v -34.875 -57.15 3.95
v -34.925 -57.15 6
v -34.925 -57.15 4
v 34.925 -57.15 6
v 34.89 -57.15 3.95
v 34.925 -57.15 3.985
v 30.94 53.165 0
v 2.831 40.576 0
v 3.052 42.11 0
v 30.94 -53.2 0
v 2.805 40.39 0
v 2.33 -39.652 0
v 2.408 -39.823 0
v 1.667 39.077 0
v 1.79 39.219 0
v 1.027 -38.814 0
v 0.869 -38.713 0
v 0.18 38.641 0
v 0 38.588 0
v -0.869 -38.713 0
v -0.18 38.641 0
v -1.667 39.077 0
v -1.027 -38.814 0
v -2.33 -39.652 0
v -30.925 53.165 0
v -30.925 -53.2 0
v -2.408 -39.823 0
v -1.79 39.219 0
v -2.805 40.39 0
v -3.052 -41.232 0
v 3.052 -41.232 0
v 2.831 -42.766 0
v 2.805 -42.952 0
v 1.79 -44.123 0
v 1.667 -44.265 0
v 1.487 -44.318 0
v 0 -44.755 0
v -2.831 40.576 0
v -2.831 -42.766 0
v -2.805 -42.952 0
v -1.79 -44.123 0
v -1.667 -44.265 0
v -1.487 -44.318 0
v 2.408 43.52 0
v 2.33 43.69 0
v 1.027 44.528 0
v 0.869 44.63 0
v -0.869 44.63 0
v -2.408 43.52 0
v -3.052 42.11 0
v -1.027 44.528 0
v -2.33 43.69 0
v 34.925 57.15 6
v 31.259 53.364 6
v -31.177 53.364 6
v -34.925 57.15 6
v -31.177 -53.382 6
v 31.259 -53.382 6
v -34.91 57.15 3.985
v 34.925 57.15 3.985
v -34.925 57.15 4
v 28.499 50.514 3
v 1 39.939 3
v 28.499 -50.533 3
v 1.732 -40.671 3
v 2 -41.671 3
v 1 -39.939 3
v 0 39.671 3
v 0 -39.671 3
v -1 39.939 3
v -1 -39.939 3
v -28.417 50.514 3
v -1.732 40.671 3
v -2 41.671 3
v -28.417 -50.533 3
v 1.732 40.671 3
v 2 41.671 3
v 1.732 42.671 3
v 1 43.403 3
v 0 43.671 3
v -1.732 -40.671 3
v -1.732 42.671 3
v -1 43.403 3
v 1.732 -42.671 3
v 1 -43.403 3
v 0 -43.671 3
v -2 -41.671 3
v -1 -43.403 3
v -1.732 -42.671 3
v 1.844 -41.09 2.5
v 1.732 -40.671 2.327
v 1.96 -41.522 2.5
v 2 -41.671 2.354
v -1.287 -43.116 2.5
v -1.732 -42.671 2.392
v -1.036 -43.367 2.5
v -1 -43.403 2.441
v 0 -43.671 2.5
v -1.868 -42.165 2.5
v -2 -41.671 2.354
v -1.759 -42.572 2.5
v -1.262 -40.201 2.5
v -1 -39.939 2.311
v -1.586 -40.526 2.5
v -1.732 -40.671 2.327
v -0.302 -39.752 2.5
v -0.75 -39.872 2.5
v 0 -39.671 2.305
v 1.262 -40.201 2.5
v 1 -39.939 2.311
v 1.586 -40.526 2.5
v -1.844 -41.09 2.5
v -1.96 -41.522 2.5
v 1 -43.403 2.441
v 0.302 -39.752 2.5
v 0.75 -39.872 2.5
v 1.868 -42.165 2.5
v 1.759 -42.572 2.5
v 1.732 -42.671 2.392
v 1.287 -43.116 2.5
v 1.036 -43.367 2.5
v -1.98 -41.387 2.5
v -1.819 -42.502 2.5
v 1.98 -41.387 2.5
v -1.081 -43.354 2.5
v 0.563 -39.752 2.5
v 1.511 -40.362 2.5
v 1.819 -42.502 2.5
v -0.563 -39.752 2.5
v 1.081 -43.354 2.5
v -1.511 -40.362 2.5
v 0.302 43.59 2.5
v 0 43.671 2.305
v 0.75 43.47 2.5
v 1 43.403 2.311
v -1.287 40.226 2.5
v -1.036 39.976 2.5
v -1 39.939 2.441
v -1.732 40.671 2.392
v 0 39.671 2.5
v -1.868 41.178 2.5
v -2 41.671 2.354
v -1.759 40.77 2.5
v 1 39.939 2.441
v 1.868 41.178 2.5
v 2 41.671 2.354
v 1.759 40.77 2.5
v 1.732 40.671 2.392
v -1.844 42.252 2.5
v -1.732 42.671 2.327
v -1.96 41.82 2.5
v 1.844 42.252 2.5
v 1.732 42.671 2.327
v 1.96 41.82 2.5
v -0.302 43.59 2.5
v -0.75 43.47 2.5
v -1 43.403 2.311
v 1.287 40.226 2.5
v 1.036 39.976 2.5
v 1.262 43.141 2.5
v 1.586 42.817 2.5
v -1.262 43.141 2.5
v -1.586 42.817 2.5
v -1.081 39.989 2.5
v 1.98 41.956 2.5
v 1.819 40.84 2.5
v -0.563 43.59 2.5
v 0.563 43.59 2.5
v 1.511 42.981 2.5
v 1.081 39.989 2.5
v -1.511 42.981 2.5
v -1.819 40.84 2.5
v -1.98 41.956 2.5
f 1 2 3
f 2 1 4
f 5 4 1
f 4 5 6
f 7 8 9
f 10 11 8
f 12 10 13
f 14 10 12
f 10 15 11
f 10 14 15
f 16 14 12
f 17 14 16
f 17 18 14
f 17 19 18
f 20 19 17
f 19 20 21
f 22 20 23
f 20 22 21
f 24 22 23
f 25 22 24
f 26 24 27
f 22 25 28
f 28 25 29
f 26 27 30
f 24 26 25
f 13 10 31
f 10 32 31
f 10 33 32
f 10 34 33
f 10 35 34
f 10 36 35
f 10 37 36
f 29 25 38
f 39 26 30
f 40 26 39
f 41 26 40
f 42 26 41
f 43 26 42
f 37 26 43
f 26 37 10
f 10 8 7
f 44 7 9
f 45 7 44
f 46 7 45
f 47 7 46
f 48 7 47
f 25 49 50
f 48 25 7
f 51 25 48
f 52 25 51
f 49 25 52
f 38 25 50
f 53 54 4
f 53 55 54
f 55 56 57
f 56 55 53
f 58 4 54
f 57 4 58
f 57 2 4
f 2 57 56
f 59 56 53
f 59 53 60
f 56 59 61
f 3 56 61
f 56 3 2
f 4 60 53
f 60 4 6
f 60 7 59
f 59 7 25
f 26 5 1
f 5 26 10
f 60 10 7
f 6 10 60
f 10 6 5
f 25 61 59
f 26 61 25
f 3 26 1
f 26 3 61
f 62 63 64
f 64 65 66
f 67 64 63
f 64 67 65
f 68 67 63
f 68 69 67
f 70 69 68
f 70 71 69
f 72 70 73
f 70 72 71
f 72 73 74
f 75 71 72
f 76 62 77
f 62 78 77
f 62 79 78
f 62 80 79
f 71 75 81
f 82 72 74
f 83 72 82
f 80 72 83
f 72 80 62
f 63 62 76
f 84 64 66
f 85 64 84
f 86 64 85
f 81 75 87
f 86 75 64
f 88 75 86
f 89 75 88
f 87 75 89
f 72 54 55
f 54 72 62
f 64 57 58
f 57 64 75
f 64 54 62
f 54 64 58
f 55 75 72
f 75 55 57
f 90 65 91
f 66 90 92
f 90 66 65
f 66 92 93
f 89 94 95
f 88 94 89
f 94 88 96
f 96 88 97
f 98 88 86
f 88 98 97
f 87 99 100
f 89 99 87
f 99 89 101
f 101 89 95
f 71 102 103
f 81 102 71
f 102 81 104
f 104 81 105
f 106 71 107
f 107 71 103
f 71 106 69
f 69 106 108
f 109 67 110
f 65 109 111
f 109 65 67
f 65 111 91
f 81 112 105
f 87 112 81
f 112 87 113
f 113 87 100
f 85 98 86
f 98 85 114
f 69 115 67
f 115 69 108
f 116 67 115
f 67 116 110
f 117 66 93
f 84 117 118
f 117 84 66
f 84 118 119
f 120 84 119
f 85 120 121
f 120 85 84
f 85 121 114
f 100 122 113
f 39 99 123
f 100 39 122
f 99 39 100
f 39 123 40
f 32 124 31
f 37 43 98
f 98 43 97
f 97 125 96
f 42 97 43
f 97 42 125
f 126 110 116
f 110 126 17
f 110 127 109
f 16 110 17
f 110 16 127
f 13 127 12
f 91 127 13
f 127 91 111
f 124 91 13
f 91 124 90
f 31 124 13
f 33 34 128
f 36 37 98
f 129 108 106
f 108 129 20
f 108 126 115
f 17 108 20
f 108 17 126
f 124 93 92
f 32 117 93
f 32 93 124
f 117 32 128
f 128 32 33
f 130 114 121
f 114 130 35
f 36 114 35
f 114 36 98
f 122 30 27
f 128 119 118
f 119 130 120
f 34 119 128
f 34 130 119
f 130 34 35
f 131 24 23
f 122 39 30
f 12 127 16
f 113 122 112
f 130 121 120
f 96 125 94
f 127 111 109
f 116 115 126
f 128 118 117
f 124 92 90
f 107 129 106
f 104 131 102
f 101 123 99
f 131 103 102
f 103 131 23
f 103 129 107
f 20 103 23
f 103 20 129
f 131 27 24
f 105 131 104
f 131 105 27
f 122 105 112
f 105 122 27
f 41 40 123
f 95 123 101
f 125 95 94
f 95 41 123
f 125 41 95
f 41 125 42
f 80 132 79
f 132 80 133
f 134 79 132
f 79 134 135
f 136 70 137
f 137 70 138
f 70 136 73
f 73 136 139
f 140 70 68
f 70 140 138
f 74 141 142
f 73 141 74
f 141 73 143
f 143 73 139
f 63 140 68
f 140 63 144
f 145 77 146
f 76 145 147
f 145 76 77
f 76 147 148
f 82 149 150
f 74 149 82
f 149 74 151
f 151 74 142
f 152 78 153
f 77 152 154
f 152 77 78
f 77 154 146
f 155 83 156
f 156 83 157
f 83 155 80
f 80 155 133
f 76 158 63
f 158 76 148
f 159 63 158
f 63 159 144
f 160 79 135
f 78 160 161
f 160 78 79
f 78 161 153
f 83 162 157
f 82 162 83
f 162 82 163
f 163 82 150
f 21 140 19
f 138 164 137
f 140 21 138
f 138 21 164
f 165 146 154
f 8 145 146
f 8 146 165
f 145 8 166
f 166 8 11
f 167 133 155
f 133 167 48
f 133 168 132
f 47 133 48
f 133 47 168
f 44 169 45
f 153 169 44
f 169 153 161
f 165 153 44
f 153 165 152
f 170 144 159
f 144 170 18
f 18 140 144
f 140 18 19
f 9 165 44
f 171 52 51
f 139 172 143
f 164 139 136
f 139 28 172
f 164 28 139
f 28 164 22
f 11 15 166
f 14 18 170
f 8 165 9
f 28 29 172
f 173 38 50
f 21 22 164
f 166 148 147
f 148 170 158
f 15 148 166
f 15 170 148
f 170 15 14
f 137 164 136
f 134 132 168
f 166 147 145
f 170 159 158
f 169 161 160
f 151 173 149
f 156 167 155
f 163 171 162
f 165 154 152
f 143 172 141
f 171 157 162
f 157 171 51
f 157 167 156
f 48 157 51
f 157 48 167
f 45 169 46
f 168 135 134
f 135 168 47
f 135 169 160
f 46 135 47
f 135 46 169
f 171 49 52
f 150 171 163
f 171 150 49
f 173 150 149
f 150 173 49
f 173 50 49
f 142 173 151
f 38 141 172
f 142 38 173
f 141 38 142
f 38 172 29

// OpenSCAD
// [FL_INDEX: keywords="openscad, 3d_parametric, WALLY_-_Wall_Plate_Customizer, csg_solid" | COT="Parametric OpenSCAD design from 3DCodeverse"]
// Title: WALLY - Wall Plate Customizer

// WALLY - Wall Plate Customizer v1.3
// by TheNewHobbyist 2013 (http://thenewhobbyist.com)
// http://www.thingiverse.com/thing:47956
//
// Most of the connectors used with this thing are panel mount connectors from
// www.DataPro.net I can't vouch for their quality but they did have easy to
// find dimensions for their products so I used them.
//
// This could be tightened up considerably but I thought I'd get it out there for people
// to experiment with before I lose my mind staring at it too long. Also this is my
// first OpenSCAD model so cut me some slack ;)
//
//   Notes:
//
// * The plug types "Duplex Outlet", "Long_Toggle Switch", "Toggle Switch", and "Rocker"
//   will all use the entire plate when selected in top or bottom configuration. The
//   other selection (if not "none" will be selected.
//
// * "None" and "Blank should not be considered equal. if "None" is selected for one of
//   the two holes on a plate the other selection will be centered on that plate. If
//   "Blank" is selected that plug location will remain blank but the other selection
//   will NOT move into a centered position.
//
//	Change Log:
//
//	v1.1
//	UPDATED: Screw hole locations for designer and toggle plate types.
//	UPDATED: Hole size for designer plate type.
//	UPDATED: Outlet hole spacing
//
//	v1.2
//	ADDED: Long Toggle Switch for laird
//
//	v1.3
//	ADDED: 3 new sizes for plate export: Standard, Junior-Jumbo, and Jumbo.
//

  //////////////////////////
 // Customizer Settings: //
//////////////////////////

//How big are we talkin' here?
plate_width = 1; //	[1:5]

// Bigger hole in your wall? Try this
plate_size = 0; // [0:Standard, 1:Junior-Jumbo, 2:Jumbo]

//Pick a plug or full plate type
1st_plate = "none";  //	["none":None, "blank":Blank Port, "toggle":Full Plate - Toggle Switch, "long_toggle":Full Plate - Long Toggle Switch, "outlet":Full Plate - Duplex Outlet, "rocker":Full Plate - Rocker/Designer Plate, "keystone1":Keystone Jack, "vga":VGA Port, "hdmi":HDMI Port, "dvi":DVI-I Port, "displayport":Displayport, "cat5e":Cat5e/Cat6 Port, "usb-a":USB-A Port, "usb-b":USB-B Port, "firewire":Firewire IEEE 1394 Port, "db09":DB-09 Port, "ps2":PS2 Port, "f-type": F-Type/Coaxial Port,"svideo":S-Video Port, "stereo":Stereo Headphone Jack]
//Pick a bottom plug type or leave as none
1st_plate_bottom_hole = "none";  //	["none":None, "blank":Blank Port, "keystone1":Keystone Jack, "vga":VGA Port, "hdmi":HDMI Port, "dvi":DVI-I Port, "displayport":Displayport, "cat5e":Cat5e/Cat6 Port, "usb-a":USB-A Port, "usb-b":USB-B Port, "firewire":Firewire IEEE 1394 Port, "db09":DB-09 Port, "ps2":PS2 Port, "f-type": F-Type/Coaxial Port,"svideo":S-Video Port, "stereo":Stereo Headphone Jack]
//Pick a plug or full plate type
2nd_plate = "none";  //	["none":None, "blank":Blank Port, "toggle":Full Plate - Toggle Switch, "long_toggle":Full Plate - Long Toggle Switch, "outlet":Full Plate - Duplex Outlet, "rocker":Full Plate - Rocker/Designer Plate, "keystone1":Keystone Jack, "vga":VGA Port, "hdmi":HDMI Port, "dvi":DVI-I Port, "displayport":Displayport, "cat5e":Cat5e/Cat6 Port, "usb-a":USB-A Port, "usb-b":USB-B Port, "firewire":Firewire IEEE 1394 Port, "db09":DB-09 Port, "ps2":PS2 Port, "f-type": F-Type/Coaxial Port,"svideo":S-Video Port, "stereo":Stereo Headphone Jack]
//Pick a bottom plug type or leave as none
2nd_plate_bottom_hole = "none";  //	["none":None, "blank":Blank Port, "keystone1":Keystone Jack, "vga":VGA Port, "hdmi":HDMI Port, "dvi":DVI-I Port, "displayport":Displayport, "cat5e":Cat5e/Cat6 Port, "usb-a":USB-A Port, "usb-b":USB-B Port, "firewire":Firewire IEEE 1394 Port, "db09":DB-09 Port, "ps2":PS2 Port, "f-type": F-Type/Coaxial Port,"svideo":S-Video Port, "stereo":Stereo Headphone Jack]
//Pick a plug or full plate type
3rd_plate = "none";  //	["none":None, "blank":Blank Port, "toggle":Full Plate - Toggle Switch, "long_toggle":Full Plate - Long Toggle Switch, "outlet":Full Plate - Duplex Outlet, "rocker":Full Plate - Rocker/Designer Plate, "keystone1":Keystone Jack, "vga":VGA Port, "hdmi":HDMI Port, "dvi":DVI-I Port, "displayport":Displayport, "cat5e":Cat5e/Cat6 Port, "usb-a":USB-A Port, "usb-b":USB-B Port, "firewire":Firewire IEEE 1394 Port, "db09":DB-09 Port, "ps2":PS2 Port, "f-type": F-Type/Coaxial Port,"svideo":S-Video Port, "stereo":Stereo Headphone Jack]
//Pick a bottom plug type or leave as none
3rd_plate_bottom_hole = "none";  //	["none":None, "blank":Blank Port, "keystone1":Keystone Jack, "vga":VGA Port, "hdmi":HDMI Port, "dvi":DVI-I Port, "displayport":Displayport, "cat5e":Cat5e/Cat6 Port, "usb-a":USB-A Port, "usb-b":USB-B Port, "firewire":Firewire IEEE 1394 Port, "db09":DB-09 Port, "ps2":PS2 Port, "f-type": F-Type/Coaxial Port,"svideo":S-Video Port, "stereo":Stereo Headphone Jack]
//Pick a plug or full plate type
4th_plate = "none";  //["none":None, "blank":Blank Port, "toggle":Full Plate - Toggle Switch, "long_toggle":Full Plate - Long Toggle Switch, "outlet":Full Plate - Duplex Outlet, "rocker":Full Plate - Rocker/Designer Plate, "keystone1":Keystone Jack, "vga":VGA Port, "hdmi":HDMI Port, "dvi":DVI-I Port, "displayport":Displayport, "cat5e":Cat5e/Cat6 Port, "usb-a":USB-A Port, "usb-b":USB-B Port, "firewire":Firewire IEEE 1394 Port, "db09":DB-09 Port, "ps2":PS2 Port, "f-type": F-Type/Coaxial Port,"svideo":S-Video Port, "stereo":Stereo Headphone Jack]
//Pick a bottom plug type or leave as none
4th_plate_bottom_hole = "none";  //	["none":None, "blank":Blank Port, "keystone1":Keystone Jack, "vga":VGA Port, "hdmi":HDMI Port, "dvi":DVI-I Port, "displayport":Displayport, "cat5e":Cat5e/Cat6 Port, "usb-a":USB-A Port, "usb-b":USB-B Port, "firewire":Firewire IEEE 1394 Port, "db09":DB-09 Port, "ps2":PS2 Port, "f-type": F-Type/Coaxial Port,"svideo":S-Video Port, "stereo":Stereo Headphone Jack]
//Pick a plug or full plate type
5th_plate = "none";  //["none":None, "blank":Blank Port, "toggle":Full Plate - Toggle Switch, "long_toggle":Full Plate - Long Toggle Switch, "outlet":Full Plate - Duplex Outlet, "rocker":Full Plate - Rocker/Designer Plate, "keystone1":Keystone Jack, "vga":VGA Port, "hdmi":HDMI Port, "dvi":DVI-I Port, "displayport":Displayport, "cat5e":Cat5e/Cat6 Port, "usb-a":USB-A Port, "usb-b":USB-B Port, "firewire":Firewire IEEE 1394 Port, "db09":DB-09 Port, "ps2":PS2 Port, "f-type": F-Type/Coaxial Port,"svideo":S-Video Port, "stereo":Stereo Headphone Jack]
//Pick a bottom plug type or leave as none
5th_plate_bottom_hole = "none";  //	["none":None, "blank":Blank Port, "keystone1":Keystone Jack, "vga":VGA Port, "hdmi":HDMI Port, "dvi":DVI-I Port, "displayport":Displayport, "cat5e":Cat5e/Cat6 Port, "usb-a":USB-A Port, "usb-b":USB-B Port, "firewire":Firewire IEEE 1394 Port, "db09":DB-09 Port, "ps2":PS2 Port, "f-type": F-Type/Coaxial Port,"svideo":S-Video Port, "stereo":Stereo Headphone Jack]

  //////////////////////
 // Static Settings: //
//////////////////////

module GoAwayCustomizer() {
// This module is here to stop Customizer from picking up the variables below
}

l_offset = [34.925,39.6875,44.45];
r_offset = [34.925,39.6875,44.45];
spacer = [0,0,46.0375,92.075,138.1125,184.15];
solid_plate_width = l_offset[plate_size] + spacer[plate_width] + r_offset[plate_size];

height_sizes = [114.3,123.825,133.35];

height = 114.3; //plate height (static)
gang_width=[0,69.86,115.824,161.925,206.375,254]; // Plate widths (standard)

edgewidth = solid_plate_width + 10; // Bevel setting for top and bottom
rightbevel = solid_plate_width - 4; // Bevel for right side (scales)

left_offset = 34.925; // Offset first hole position
switch_offset = 46.0375; // Offset all additional holes
thinner_offset=[0,0.92,0.95,0.96,0.97,0.973]; // Manual fix for right side wackiness

positions=[height_sizes[plate_size]/2,height_sizes[plate_size]/2 - 14.25,height_sizes[plate_size]/2 + 14.25];

// preview[view:north, tilt:bottom]

  ///////////////////
 // Hole Control: //
///////////////////

module plate1(){
	if (1st_plate == "toggle" || 1st_plate_bottom_hole == "toggle"){
		translate([0,l_offset[plate_size],0]) toggle_screws();
		translate([0,l_offset[plate_size],0]) hole("toggle");
		}
	else if (1st_plate == "long_toggle" || 1st_plate_bottom_hole == "long_toggle"){
		translate([0,l_offset[plate_size],0]) toggle_screws();
		translate([0,l_offset[plate_size],0]) hole("long_toggle");
		}
	else if (1st_plate == "rocker" || 1st_plate_bottom_hole == "rocker"){
		translate([0,l_offset[plate_size],0]) rocker_screws();
		translate([0,l_offset[plate_size],0]) hole("rocker");
		}
	else if (1st_plate == "outlet" || 1st_plate_bottom_hole == "outlet") {
	translate([0,l_offset[plate_size],0]) hole("outlet");
	}
	else if (1st_plate_bottom_hole == "none") {
		translate([0,l_offset[plate_size],0]) box_screws();
		translate([positions[0],l_offset[plate_size],0]) hole(1st_plate);
			}
	else if (1st_plate == "none") {
		translate([0,l_offset[plate_size],0]) box_screws();
		translate([positions[0],l_offset[plate_size],0]) hole(1st_plate_bottom_hole);
			}
	else {
	translate([0,l_offset[plate_size],0]) box_screws();
	translate([positions[1],l_offset[plate_size],0]) hole(1st_plate);
	translate([positions[2],l_offset[plate_size],0]) hole(1st_plate_bottom_hole);
	}
}

module plate2(){
	if (2nd_plate == "toggle" || 2nd_plate_bottom_hole == "toggle"){
		translate([0,l_offset[plate_size] + switch_offset,0]) toggle_screws();
		translate([0,l_offset[plate_size] + switch_offset,0]) hole("toggle");
		}
	else if (2nd_plate == "long_toggle" || 2nd_plate_bottom_hole == "long_toggle"){
		translate([0,l_offset[plate_size] + switch_offset,0]) toggle_screws();
		translate([0,l_offset[plate_size] + switch_offset,0]) hole("long_toggle");
		}
	else if (2nd_plate == "rocker" || 2nd_plate_bottom_hole == "rocker"){
		translate([0,l_offset[plate_size] + switch_offset,0]) rocker_screws();
		translate([0,l_offset[plate_size] + switch_offset,0]) hole("rocker");
		}
	else if (2nd_plate == "outlet" || 2nd_plate_bottom_hole == "outlet") {
	translate([0,l_offset[plate_size] + switch_offset,0]) hole("outlet");
	}
	else if (2nd_plate_bottom_hole == "none") {
		translate([0,l_offset[plate_size] + switch_offset,0]) box_screws();
		translate([positions[0],l_offset[plate_size] + switch_offset,0]) hole(2nd_plate);
			}
	else if (2nd_plate == "none") {
		translate([0,l_offset[plate_size] + switch_offset,0]) box_screws();
		translate([positions[0],l_offset[plate_size] + switch_offset,0]) hole(2nd_plate_bottom_hole);
			}
	else {
	translate([0,l_offset[plate_size] + switch_offset,0]) box_screws();
	translate([positions[1],l_offset[plate_size] + switch_offset,0]) hole(2nd_plate);
	translate([positions[2],l_offset[plate_size] + switch_offset,0]) hole(2nd_plate_bottom_hole);
	}
}

module plate3(){
	if (3rd_plate == "toggle" || 3rd_plate_bottom_hole == "toggle"){
		translate([0,l_offset[plate_size] + switch_offset * 2,0]) toggle_screws();
		translate([0,l_offset[plate_size] + switch_offset * 2,0]) hole("toggle");
		}
	else if (3rd_plate == "long_toggle" || 3rd_plate_bottom_hole == "long_toggle"){
		translate([0,l_offset[plate_size] + switch_offset * 2,0]) toggle_screws();
		translate([0,l_offset[plate_size] + switch_offset * 2,0]) hole("long_toggle");
		}
	else if (3rd_plate == "rocker" || 3rd_plate_bottom_hole == "rocker"){
		translate([0,l_offset[plate_size] + switch_offset * 2,0]) rocker_screws();
		translate([0,l_offset[plate_size] + switch_offset * 2,0]) hole("rocker");
		}
	else if (3rd_plate == "outlet" || 3rd_plate_bottom_hole == "outlet") {
	translate([0,l_offset[plate_size] + switch_offset * 2,0]) hole("outlet");
	}
	else if (3rd_plate_bottom_hole == "none") {
		translate([0,l_offset[plate_size] + switch_offset * 2,0]) box_screws();
		translate([positions[0],l_offset[plate_size] + switch_offset * 2,0]) hole(3rd_plate);
			}
	else if (3rd_plate == "none") {
		translate([0,l_offset[plate_size] + switch_offset * 2,0]) box_screws();
		translate([positions[0],l_offset[plate_size] + switch_offset * 2,0]) hole(3rd_plate_bottom_hole);
			}
	else {
	translate([0,l_offset[plate_size] + switch_offset * 2,0]) box_screws();
	translate([positions[1],l_offset[plate_size] + switch_offset * 2,0]) hole(3rd_plate);
	translate([positions[2],l_offset[plate_size] + switch_offset * 2,0]) hole(3rd_plate_bottom_hole);
	}
}

module plate4(){
	if (4th_plate == "toggle" || 4th_plate_bottom_hole == "toggle"){
		translate([0,l_offset[plate_size] + switch_offset * 3,0]) toggle_screws();
		translate([0,l_offset[plate_size] + switch_offset * 3,0]) hole("toggle");
		}
	else if (4th_plate == "long_toggle" || 4th_plate_bottom_hole == "long_toggle"){
		translate([0,l_offset[plate_size] + switch_offset * 3,0]) toggle_screws();
		translate([0,l_offset[plate_size] + switch_offset * 3,0]) hole("long_toggle");
		}
	else if (4th_plate == "rocker" || 4th_plate_bottom_hole == "rocker"){
		translate([0,l_offset[plate_size] + switch_offset * 3,0]) rocker_screws();
		translate([0,l_offset[plate_size] + switch_offset * 3,0]) hole("rocker");
		}
	else if (4th_plate == "outlet" || 4th_plate_bottom_hole == "outlet") {
	translate([0,l_offset[plate_size] + switch_offset * 3,0]) hole("outlet");
	}
	else if (4th_plate_bottom_hole == "none") {
		translate([0,l_offset[plate_size] + switch_offset * 3,0]) box_screws();
		translate([positions[0],l_offset[plate_size] + switch_offset * 3,0]) hole(4th_plate);
			}
	else if (4th_plate == "none") {
		translate([0,l_offset[plate_size] + switch_offset * 3,0]) box_screws();
		translate([positions[0],l_offset[plate_size] + switch_offset * 3,0]) hole(4th_plate_bottom_hole);
			}
	else {
	translate([0,l_offset[plate_size] + switch_offset * 3,0]) box_screws();
	translate([positions[1],l_offset[plate_size] + switch_offset * 3,0]) hole(4th_plate);
	translate([positions[2],l_offset[plate_size] + switch_offset * 3,0]) hole(4th_plate_bottom_hole);
	}
}

module plate5(){
	if (5th_plate == "toggle" || 5th_plate_bottom_hole == "toggle"){
		translate([0,l_offset[plate_size] + switch_offset * 4,0]) toggle_screws();
		translate([0,l_offset[plate_size] + switch_offset * 4,0]) hole("toggle");
		}
	else if (5th_plate == "long_toggle" || 5th_plate_bottom_hole == "long_toggle"){
		translate([0,l_offset[plate_size] + switch_offset * 4,0]) toggle_screws();
		translate([0,l_offset[plate_size] + switch_offset * 4,0]) hole("long_toggle");
		}
	else if (5th_plate == "rocker" || 5th_plate_bottom_hole == "rocker"){
		translate([0,l_offset[plate_size] + switch_offset * 4,0]) rocker_screws();
		translate([0,l_offset[plate_size] + switch_offset * 4,0]) hole("rocker");
		}
	else if (5th_plate == "outlet" || 5th_plate_bottom_hole == "outlet") {
	translate([0,l_offset[plate_size] + switch_offset * 4,0]) hole("outlet");
	}
	else if (5th_plate_bottom_hole == "none") {
		translate([0,l_offset[plate_size] + switch_offset * 4,0]) box_screws();
		translate([positions[0],l_offset[plate_size] + switch_offset * 4,0]) hole(5th_plate);
			}
	else if (5th_plate == "none") {
		translate([0,l_offset[plate_size] + switch_offset * 4,0]) box_screws();
		translate([positions[0],l_offset[plate_size] + switch_offset * 4,0]) hole(5th_plate_bottom_hole);
			}
	else {
	translate([0,l_offset[plate_size] + switch_offset * 4,0]) box_screws();
	translate([positions[1],l_offset[plate_size] + switch_offset * 4,0]) hole(5th_plate);
	translate([positions[2],l_offset[plate_size] + switch_offset * 4,0]) hole(5th_plate_bottom_hole);
	}
}

  /////////////////
 // SolidWorks: //
/////////////////

module plate1_solid(){
if (1st_plate == "keystone1" && 1st_plate_bottom_hole == "none") {
	translate([height_sizes[plate_size]/2 + 14.3,l_offset[plate_size] - 11.5,-3.9]) hole("keystone_solid");
	}
else if (1st_plate == "keystone1" && 1st_plate_bottom_hole != "outlet" && 1st_plate_bottom_hole != "toggle" && 1st_plate_bottom_hole != "rocker") {
	translate([height_sizes[plate_size]/2,l_offset[plate_size] - 11.5,-3.9]) hole("keystone_solid");
	}
if (1st_plate_bottom_hole == "keystone1" && 1st_plate == "none") {
	translate([height_sizes[plate_size]/2 + 14.3,l_offset[plate_size] - 11.5,-3.9]) hole("keystone_solid");
	}
else if (1st_plate_bottom_hole == "keystone1" && 1st_plate != "outlet" && 1st_plate != "toggle" && 1st_plate != "rocker") {
	translate([height_sizes[plate_size]/2 + 28.5,l_offset[plate_size] - 11.5,-3.9]) hole("keystone_solid");
	}

}

module plate2_solid(){
if (2nd_plate == "keystone1" && 2nd_plate_bottom_hole == "none") {
	translate([height_sizes[plate_size]/2 + 14.3,l_offset[plate_size] - 11.5 + switch_offset,-3.9]) hole("keystone_solid");
	}
else if (2nd_plate == "keystone1" && 2nd_plate_bottom_hole != "outlet" && 2nd_plate_bottom_hole != "toggle" && 2nd_plate_bottom_hole != "rocker") {
	translate([height_sizes[plate_size]/2,l_offset[plate_size] - 11.5 + switch_offset,-3.9]) hole("keystone_solid");
	}
if (2nd_plate_bottom_hole == "keystone1" && 2nd_plate == "none") {
	translate([height_sizes[plate_size]/2 + 14.3,l_offset[plate_size] - 11.5 + switch_offset,-3.9]) hole("keystone_solid");
	}
else if (2nd_plate_bottom_hole == "keystone1" && 2nd_plate != "outlet" && 2nd_plate != "toggle" && 2nd_plate != "rocker") {
	translate([height_sizes[plate_size]/2 + 28.5,l_offset[plate_size] - 11.5 + switch_offset,-3.9]) hole("keystone_solid");
	}

}

module plate3_solid(){
if (3rd_plate == "keystone1" && 3rd_plate_bottom_hole == "none") {
	translate([height_sizes[plate_size]/2 + 14.3,l_offset[plate_size] - 11.5 + switch_offset * 2,-3.9]) hole("keystone_solid");
	}
else if (3rd_plate == "keystone1" && 3rd_plate_bottom_hole != "outlet" && 3rd_plate_bottom_hole != "toggle" && 3rd_plate_bottom_hole != "rocker") {
	translate([height_sizes[plate_size]/2,l_offset[plate_size] - 11.5 + switch_offset * 2,-3.9]) hole("keystone_solid");
	}
if (3rd_plate_bottom_hole == "keystone1" && 3rd_plate == "none") {
	translate([height_sizes[plate_size]/2 + 14.3,l_offset[plate_size] - 11.5 + switch_offset * 2,-3.9]) hole("keystone_solid");
	}
else if (3rd_plate_bottom_hole == "keystone1" && 3rd_plate != "outlet" && 3rd_plate != "toggle" && 3rd_plate != "rocker") {
	translate([height_sizes[plate_size]/2 + 28.5,l_offset[plate_size] - 11.5 + switch_offset * 2,-3.9]) hole("keystone_solid");
	}

}

module plate4_solid(){
if (4th_plate == "keystone1" && 4th_plate_bottom_hole == "none") {
	translate([height_sizes[plate_size]/2 + 14.3,l_offset[plate_size] - 11.5 + switch_offset * 3,-3.9]) hole("keystone_solid");
	}
else if (4th_plate == "keystone1" && 4th_plate_bottom_hole != "outlet" && 4th_plate_bottom_hole != "toggle" && 4th_plate_bottom_hole != "rocker") {
	translate([height_sizes[plate_size]/2,l_offset[plate_size] - 11.5 + switch_offset * 3,-3.9]) hole("keystone_solid");
	}
if (4th_plate_bottom_hole == "keystone1" && 4th_plate == "none") {
	translate([height_sizes[plate_size]/2 + 14.3,l_offset[plate_size] - 11.5 + switch_offset * 3,-3.9]) hole("keystone_solid");
	}
else if (4th_plate_bottom_hole == "keystone1" && 4th_plate != "outlet" && 4th_plate != "toggle" && 4th_plate != "rocker") {
	translate([height_sizes[plate_size]/2 + 28.5,l_offset[plate_size] - 11.5 + switch_offset * 3,-3.9]) hole("keystone_solid");
	}

}

module plate5_solid(){
if (5th_plate == "keystone1" && 5th_plate_bottom_hole == "none") {
	translate([height_sizes[plate_size]/2 + 14.3,l_offset[plate_size] - 11.5 + switch_offset * 4,-3.9]) hole("keystone_solid");
	}
else if (5th_plate == "keystone1" && 5th_plate_bottom_hole != "outlet" && 5th_plate_bottom_hole != "toggle" && 5th_plate_bottom_hole != "rocker") {
	translate([height_sizes[plate_size]/2,l_offset[plate_size] - 11.5 + switch_offset * 4,-3.9]) hole("keystone_solid");
	}
if (5th_plate_bottom_hole == "keystone1" && 5th_plate == "none") {
	translate([height_sizes[plate_size]/2 + 14.3,l_offset[plate_size] - 11.5 + switch_offset * 4,-3.9]) hole("keystone_solid");
	}
else if (5th_plate_bottom_hole == "keystone1" && 5th_plate != "outlet" && 5th_plate != "toggle" && 5th_plate != "rocker") {
	translate([height_sizes[plate_size]/2 + 28.5,l_offset[plate_size] - 11.5 + switch_offset * 4,-3.9]) hole("keystone_solid");
	}

}

  ///////////////////
 // PlateStation: //
///////////////////

//Plate size and bevel
module plate() {
	difference() {
		cube([height_sizes[plate_size],solid_plate_width,6]);
		translate([-4.3,-5,6.2]) rotate([0,45,0]) cube([6,edgewidth,6]); //Top Bevel
		translate([height_sizes[plate_size]-4.2,-5,6.25]) rotate([0,45,0]) cube([6,edgewidth,6]); //Bottom Bevel
		translate([height_sizes[plate_size]+10,-4.4,6.1]) rotate([0,45,90]) cube([6,height_sizes[plate_size]+20,6]); //Left Bevel (doesn't change)
		translate([height_sizes[plate_size]+10,rightbevel,6]) rotate([0,45,90]) cube([6,height_sizes[plate_size]+10,6]); //Right Bevel (scales right)
				}
			}


// Thinning Plate
module plate_inner() {
	scale([0.95,thinner_offset[plate_width],1]){
	translate([3,3,0]){
	difference() {
		cube([height_sizes[plate_size],solid_plate_width,6]);
		translate([-4.3,-5,6.2]) rotate([0,45,0]) cube([6,edgewidth,6]); //Top Bevel
		translate([height_sizes[plate_size]-4.2,-5,6.25]) rotate([0,45,0]) cube([6,edgewidth,6]); //Bottom Bevel
		translate([height_sizes[plate_size]+10,-4.4,6.1]) rotate([0,45,90]) cube([6,height_sizes[plate_size]+20,6]); //Left Bevel (doesn't change)
		translate([height_sizes[plate_size]+10,rightbevel,6]) rotate([0,45,90]) cube([6,height_sizes[plate_size]+10,6]); //Right Bevel (scales right)
				}
			}
		}
	}

// Box screw holes
module box_screws(){
	 translate([height_sizes[plate_size]/2 + 41.67125,0,-1]) cylinder(r=2, h=10, $fn=12);
	 translate([height_sizes[plate_size]/2 + 41.67125,0,3.5]) cylinder(r1=2, r2=3.3, h=3);
	 translate([height_sizes[plate_size]/2 - 41.67125,0,-1]) cylinder(r=2, h=10, $fn=12);
	 translate([height_sizes[plate_size]/2 - 41.67125,0,3.5]) cylinder(r1=2, r2=3.3, h=3);
}

// Rocker/Designer screw holes
module rocker_screws(){
	 translate([height_sizes[plate_size]/2 + 48.41875,0,-1]) cylinder(r=2, h=10, $fn=12);
	 translate([height_sizes[plate_size]/2 + 48.41875,0,3.5]) cylinder(r1=2, r2=3.3, h=3);
	 translate([height_sizes[plate_size]/2 - 48.41875,0,-1]) cylinder(r=2, h=10, $fn=12);
	 translate([height_sizes[plate_size]/2 - 48.41875,0,3.5]) cylinder(r1=2, r2=3.3, h=3);
}

// Toggle screw holes
module toggle_screws(){
	 translate([height_sizes[plate_size]/2 + 30.1625,0,-1]) cylinder(r=2, h=10, $fn=12);
	 translate([height_sizes[plate_size]/2 + 30.1625,0,3.5]) cylinder(r1=2, r2=3.3, h=3);
	 translate([height_sizes[plate_size]/2 - 30.1625,0,-1]) cylinder(r=2, h=10, $fn=12);
	 translate([height_sizes[plate_size]/2 - 30.1625,0,3.5]) cylinder(r1=2, r2=3.3, h=3);
}

  ///////////////
 // Portland: //
///////////////

// Hole Cutout definitions
module hole(hole_type) {


// Toggle switch hole
	if (hole_type == "toggle") {
		translate([height_sizes[plate_size]/2,0,0]) cube([23.8125,10.3188,15], center = true);
		 						}

// Toggle switch hole and screw holes
	if (hole_type == "long_toggle") {
		translate([height_sizes[plate_size]/2,0,0]) cube([43.6563,11.9063,15], center = true);
		 						}

// Rocker switch plate
	if (hole_type == "rocker") {
		translate([height_sizes[plate_size]/2,0,0]) cube([67.1,33.3,15], center = true);

		 						}

// Duplex power outlet plate or dual side toggles
	if (hole_type == "outlet" || hole_type == "dualsidetoggle") {
		translate([height_sizes[plate_size]/2 + 19.3915,0,0]) {
			difference() {
				cylinder(r=17.4625, h=15, center = true);
				translate([-24.2875,-15,-2]) cube([10,37,15], center = false);
				translate([14.2875,-15,-2]) cube([10,37,15], center = false);
								}
							}
		translate([height_sizes[plate_size]/2 - 19.3915,0,0]){
			difference(){
				cylinder(r=17.4625, h=15, center = true);
				translate([-24.2875,-15,-2]) cube([10,37,15], center = false);
				translate([14.2875,-15,-2]) cube([10,37,15], center = false);
								}
							}
		translate([height_sizes[plate_size]/2,0,-1]) cylinder(r=2, h=10);
		translate([height_sizes[plate_size]/2,0,3.5]) cylinder(r1=2, r2=3.3, h=3);
							}

// Blank plate
	if (hole_type == "blank") { }

// VGA & DB09 plate
// VGA Fits http://www.datapro.net/products/vga-dual-panel-mount-f-f-cable.html
// DB09 Fits http://www.datapro.net/products/db9-serial-panel-mount-male-extension.html
	if (hole_type == "vga" || hole_type == "db09") {

			translate([0,-12.5,3]) cylinder(r=1.75, h=10, center = true);
			translate([0,12.5,3]) cylinder(r=1.75, h=10, center = true);
				difference(){
					cube([10,19,13], center=true);
					translate([-5,-9.2,1]) rotate([0,0,-35.6]) cube([4.4,2.4,15], center=true);
					translate([.9,-11.2,0]) rotate([0,0,9.6]) cube([10,4.8,15], center=true);
					translate([4.6,-8.5,0]) rotate([0,0,37.2]) cube([4.4,2.4,15], center=true);
					translate([-5,9.2,1]) rotate([0,0,35.6]) cube([4.4,2.4,15], center=true);
					translate([0.9,11.2,0]) rotate([0,0,-9.6]) cube([10,4.8,15], center=true);
					translate([4.6,8.5,0]) rotate([0,0,-37.2]) cube([4.4,2.4,15], center=true);
								}
						}

// HDMI plate
// Fits http://www.datapro.net/products/hdmi-panel-mount-extension-cable.html
	if (hole_type == "hdmi") {
		translate([0,-13,3]) cylinder(r=1.75, h=10, center = true);
		translate([0,13,3]) cylinder(r=1.75, h=10, center = true);
		translate([0,0,3]) cube([6,16,10], center=true);
							}

// DVI-I plate
// Fits http://www.datapro.net/products/dvi-i-panel-mount-extension-cable.html
	if (hole_type == "dvi") {
		translate([0,-16,3]) cylinder(r=1.75, h=10, center = true);
		translate([0,16,3]) cylinder(r=1.75, h=10, center = true);
		translate([0,0,3]) cube([10,26,10], center=true);
							}

// DisplayPort plate
// Fits http://www.datapro.net/products/dvi-i-panel-mount-extension-cable.html
	if (hole_type == "displayport") {
		translate([0,-13.5,3]) cylinder(r=1.75, h=10, center = true);
		translate([0,13.5,3]) cylinder(r=1.75, h=10, center = true);
		translate([0,0,0]){
			difference(){
				translate([0,0,3]) cube([7,19,10], center=true);
				translate([2.47,-9.37,3]) rotate([0,0,-54.6]) cube([3,5,14], center=true);
						}
								}
									}

// USB-A Plate
// Fits http://www.datapro.net/products/usb-panel-mount-type-a-cable.html
	if (hole_type == "usb-a") {
		translate([0,-15,3]) cylinder(r=1.75, h=10, center = true);
		translate([0,15,3]) cylinder(r=1.75, h=10, center = true);
		translate([0,0,3]) cube([8,16,10], center=true);
							}

// USB-B Plate
// Fits http://www.datapro.net/products/usb-panel-mount-type-b-cable.html
	if (hole_type == "usb-b") {
		translate([0,-13,3]) cylinder(r=1.75, h=10, center = true);
		translate([0,13,3]) cylinder(r=1.75, h=10, center = true);
		translate([0,0,3]) cube([11,12,10], center=true);
							}

// 1394 Firewire Plate
// Fits http://www.datapro.net/products/firewire-panel-mount-extension.html
	if (hole_type == "firewire") {
		translate([0,-13.5,3]) cylinder(r=1.75, h=10, center = true);
		translate([0,13.5,3]) cylinder(r=1.75, h=10, center = true);
		translate([0,0,3]) cube([7,12,10], center=true);
							}

// F-Type / Cable TV Plate
// Fits http://www.datapro.net/products/f-type-panel-mounting-coupler.html
	if (hole_type == "f-type") {
		translate([0,0,3]) cylinder(r=4.7625, h=10, center=true);
							}

// Cat5e & Gat6 plate
// Cat5e Fits http://www.datapro.net/products/cat-5e-panel-mount-ethernet.html
// Cat6 Fits hhttp://www.datapro.net/products/cat-6-panel-mount-ethernet.html
	if (hole_type == "cat5e" || hole_type == "cat6") {
		translate([0,-12.5,3]) cylinder(r=1.75, h=10, center = true);
		translate([0,12.5,3]) cylinder(r=1.75, h=10, center = true);
		translate([0,0,3]) cube([15,15,10], center=true);
		}

// S-Video & PS2 plate
// S-Video Fits hhttp://www.datapro.net/products/cat-6-panel-mount-ethernet.html
// PS2 http://www.datapro.net/products/ps2-panel-mount-extension-cable.html
	if (hole_type == "svideo" || hole_type == "ps2") {
		translate([0,-10,3]) cylinder(r=1.75, h=10, center = true);
		translate([0,10,3]) cylinder(r=1.75, h=10, center = true);
		translate([0,0,3]) cylinder(r=5, h=10, center=true);
		}


// Stereo / 1/4" headphone jack coupler
// Stereo coupler Fits http://www.datapro.net/products/stereo-panel-mount-coupler.html
	if (hole_type == "stereo") {
		translate([0,0,3]) cylinder(r=2.985, h=10, center=true);
		}

//Keystone1 hole
//Hole for 1 Keystone Jack
	if (hole_type == "keystone1") {
		translate([0,0,5]) cube([16.5,15,10], center = true);
	}

//Keystone Solid
	if (hole_type == "keystone_solid") {
		rotate([0,0,90]) {
			difference(){
				translate([0,0,.1]) cube([23,30.5,9.8]);
					translate([4,4,0]){
						difference(){
							cube([15,22.5,10]);
							translate([-1,-0.001,3.501]) cube([17,2,6.5]);
							translate([-1,2.5,-3.40970]) rotate([45,0,0]) cube([17,2,6.5]);
							translate([-1,18.501,6.001]) cube([17,4,4]);
							translate([-1,20.5,0]) rotate([-45,0,0]) cube([17,2,6.5]);
						}
					}
				}
			}
		}

//End of module "hole"
}

  ////////////////////////
 // Number One ENGAGE: //
////////////////////////

// Rotate so it sits correctly on plate (whoops) and make upside down
rotate([0,180,90]){
// put plate at 0,0,0 for easier printing
translate([-height_sizes[plate_size]/2,-solid_plate_width/2,-6]){

if (plate_width == 1) {
	difference() {
		plate();
		translate([0,0,-3]) plate_inner();
		plate1();
			}
		union() {
		plate1_solid();
		}
			}

else if (plate_width == 2) {
difference()
{
plate();
translate([0,0,-3]) plate_inner();
plate1();
plate2();
}
union() {
		plate1_solid();
		plate2_solid();
		}
}

else if (plate_width == 3) {
difference()
{
plate();
translate([0,0,-3]) plate_inner();
plate1();
plate2();
plate3();
}
union() {
		plate1_solid();
		plate2_solid();
		plate3_solid();
		}
}

else if (plate_width == 4) {
difference()
{
plate();
translate([0,0,-3]) plate_inner();
plate1();
plate2();
plate3();
plate4();
}
union() {
		plate1_solid();
		plate2_solid();
		plate3_solid();
		plate4_solid();
		}
}

else if (plate_width == 5) {
difference()
{
plate();
translate([0,0,-3]) plate_inner();
plate1();
plate2();
plate3();
plate4();
plate5();
}
union() {
		plate1_solid();
		plate2_solid();
		plate3_solid();
		plate4_solid();
		plate5_solid();
		}
}

//End Rotate
}
//End Translate
}
